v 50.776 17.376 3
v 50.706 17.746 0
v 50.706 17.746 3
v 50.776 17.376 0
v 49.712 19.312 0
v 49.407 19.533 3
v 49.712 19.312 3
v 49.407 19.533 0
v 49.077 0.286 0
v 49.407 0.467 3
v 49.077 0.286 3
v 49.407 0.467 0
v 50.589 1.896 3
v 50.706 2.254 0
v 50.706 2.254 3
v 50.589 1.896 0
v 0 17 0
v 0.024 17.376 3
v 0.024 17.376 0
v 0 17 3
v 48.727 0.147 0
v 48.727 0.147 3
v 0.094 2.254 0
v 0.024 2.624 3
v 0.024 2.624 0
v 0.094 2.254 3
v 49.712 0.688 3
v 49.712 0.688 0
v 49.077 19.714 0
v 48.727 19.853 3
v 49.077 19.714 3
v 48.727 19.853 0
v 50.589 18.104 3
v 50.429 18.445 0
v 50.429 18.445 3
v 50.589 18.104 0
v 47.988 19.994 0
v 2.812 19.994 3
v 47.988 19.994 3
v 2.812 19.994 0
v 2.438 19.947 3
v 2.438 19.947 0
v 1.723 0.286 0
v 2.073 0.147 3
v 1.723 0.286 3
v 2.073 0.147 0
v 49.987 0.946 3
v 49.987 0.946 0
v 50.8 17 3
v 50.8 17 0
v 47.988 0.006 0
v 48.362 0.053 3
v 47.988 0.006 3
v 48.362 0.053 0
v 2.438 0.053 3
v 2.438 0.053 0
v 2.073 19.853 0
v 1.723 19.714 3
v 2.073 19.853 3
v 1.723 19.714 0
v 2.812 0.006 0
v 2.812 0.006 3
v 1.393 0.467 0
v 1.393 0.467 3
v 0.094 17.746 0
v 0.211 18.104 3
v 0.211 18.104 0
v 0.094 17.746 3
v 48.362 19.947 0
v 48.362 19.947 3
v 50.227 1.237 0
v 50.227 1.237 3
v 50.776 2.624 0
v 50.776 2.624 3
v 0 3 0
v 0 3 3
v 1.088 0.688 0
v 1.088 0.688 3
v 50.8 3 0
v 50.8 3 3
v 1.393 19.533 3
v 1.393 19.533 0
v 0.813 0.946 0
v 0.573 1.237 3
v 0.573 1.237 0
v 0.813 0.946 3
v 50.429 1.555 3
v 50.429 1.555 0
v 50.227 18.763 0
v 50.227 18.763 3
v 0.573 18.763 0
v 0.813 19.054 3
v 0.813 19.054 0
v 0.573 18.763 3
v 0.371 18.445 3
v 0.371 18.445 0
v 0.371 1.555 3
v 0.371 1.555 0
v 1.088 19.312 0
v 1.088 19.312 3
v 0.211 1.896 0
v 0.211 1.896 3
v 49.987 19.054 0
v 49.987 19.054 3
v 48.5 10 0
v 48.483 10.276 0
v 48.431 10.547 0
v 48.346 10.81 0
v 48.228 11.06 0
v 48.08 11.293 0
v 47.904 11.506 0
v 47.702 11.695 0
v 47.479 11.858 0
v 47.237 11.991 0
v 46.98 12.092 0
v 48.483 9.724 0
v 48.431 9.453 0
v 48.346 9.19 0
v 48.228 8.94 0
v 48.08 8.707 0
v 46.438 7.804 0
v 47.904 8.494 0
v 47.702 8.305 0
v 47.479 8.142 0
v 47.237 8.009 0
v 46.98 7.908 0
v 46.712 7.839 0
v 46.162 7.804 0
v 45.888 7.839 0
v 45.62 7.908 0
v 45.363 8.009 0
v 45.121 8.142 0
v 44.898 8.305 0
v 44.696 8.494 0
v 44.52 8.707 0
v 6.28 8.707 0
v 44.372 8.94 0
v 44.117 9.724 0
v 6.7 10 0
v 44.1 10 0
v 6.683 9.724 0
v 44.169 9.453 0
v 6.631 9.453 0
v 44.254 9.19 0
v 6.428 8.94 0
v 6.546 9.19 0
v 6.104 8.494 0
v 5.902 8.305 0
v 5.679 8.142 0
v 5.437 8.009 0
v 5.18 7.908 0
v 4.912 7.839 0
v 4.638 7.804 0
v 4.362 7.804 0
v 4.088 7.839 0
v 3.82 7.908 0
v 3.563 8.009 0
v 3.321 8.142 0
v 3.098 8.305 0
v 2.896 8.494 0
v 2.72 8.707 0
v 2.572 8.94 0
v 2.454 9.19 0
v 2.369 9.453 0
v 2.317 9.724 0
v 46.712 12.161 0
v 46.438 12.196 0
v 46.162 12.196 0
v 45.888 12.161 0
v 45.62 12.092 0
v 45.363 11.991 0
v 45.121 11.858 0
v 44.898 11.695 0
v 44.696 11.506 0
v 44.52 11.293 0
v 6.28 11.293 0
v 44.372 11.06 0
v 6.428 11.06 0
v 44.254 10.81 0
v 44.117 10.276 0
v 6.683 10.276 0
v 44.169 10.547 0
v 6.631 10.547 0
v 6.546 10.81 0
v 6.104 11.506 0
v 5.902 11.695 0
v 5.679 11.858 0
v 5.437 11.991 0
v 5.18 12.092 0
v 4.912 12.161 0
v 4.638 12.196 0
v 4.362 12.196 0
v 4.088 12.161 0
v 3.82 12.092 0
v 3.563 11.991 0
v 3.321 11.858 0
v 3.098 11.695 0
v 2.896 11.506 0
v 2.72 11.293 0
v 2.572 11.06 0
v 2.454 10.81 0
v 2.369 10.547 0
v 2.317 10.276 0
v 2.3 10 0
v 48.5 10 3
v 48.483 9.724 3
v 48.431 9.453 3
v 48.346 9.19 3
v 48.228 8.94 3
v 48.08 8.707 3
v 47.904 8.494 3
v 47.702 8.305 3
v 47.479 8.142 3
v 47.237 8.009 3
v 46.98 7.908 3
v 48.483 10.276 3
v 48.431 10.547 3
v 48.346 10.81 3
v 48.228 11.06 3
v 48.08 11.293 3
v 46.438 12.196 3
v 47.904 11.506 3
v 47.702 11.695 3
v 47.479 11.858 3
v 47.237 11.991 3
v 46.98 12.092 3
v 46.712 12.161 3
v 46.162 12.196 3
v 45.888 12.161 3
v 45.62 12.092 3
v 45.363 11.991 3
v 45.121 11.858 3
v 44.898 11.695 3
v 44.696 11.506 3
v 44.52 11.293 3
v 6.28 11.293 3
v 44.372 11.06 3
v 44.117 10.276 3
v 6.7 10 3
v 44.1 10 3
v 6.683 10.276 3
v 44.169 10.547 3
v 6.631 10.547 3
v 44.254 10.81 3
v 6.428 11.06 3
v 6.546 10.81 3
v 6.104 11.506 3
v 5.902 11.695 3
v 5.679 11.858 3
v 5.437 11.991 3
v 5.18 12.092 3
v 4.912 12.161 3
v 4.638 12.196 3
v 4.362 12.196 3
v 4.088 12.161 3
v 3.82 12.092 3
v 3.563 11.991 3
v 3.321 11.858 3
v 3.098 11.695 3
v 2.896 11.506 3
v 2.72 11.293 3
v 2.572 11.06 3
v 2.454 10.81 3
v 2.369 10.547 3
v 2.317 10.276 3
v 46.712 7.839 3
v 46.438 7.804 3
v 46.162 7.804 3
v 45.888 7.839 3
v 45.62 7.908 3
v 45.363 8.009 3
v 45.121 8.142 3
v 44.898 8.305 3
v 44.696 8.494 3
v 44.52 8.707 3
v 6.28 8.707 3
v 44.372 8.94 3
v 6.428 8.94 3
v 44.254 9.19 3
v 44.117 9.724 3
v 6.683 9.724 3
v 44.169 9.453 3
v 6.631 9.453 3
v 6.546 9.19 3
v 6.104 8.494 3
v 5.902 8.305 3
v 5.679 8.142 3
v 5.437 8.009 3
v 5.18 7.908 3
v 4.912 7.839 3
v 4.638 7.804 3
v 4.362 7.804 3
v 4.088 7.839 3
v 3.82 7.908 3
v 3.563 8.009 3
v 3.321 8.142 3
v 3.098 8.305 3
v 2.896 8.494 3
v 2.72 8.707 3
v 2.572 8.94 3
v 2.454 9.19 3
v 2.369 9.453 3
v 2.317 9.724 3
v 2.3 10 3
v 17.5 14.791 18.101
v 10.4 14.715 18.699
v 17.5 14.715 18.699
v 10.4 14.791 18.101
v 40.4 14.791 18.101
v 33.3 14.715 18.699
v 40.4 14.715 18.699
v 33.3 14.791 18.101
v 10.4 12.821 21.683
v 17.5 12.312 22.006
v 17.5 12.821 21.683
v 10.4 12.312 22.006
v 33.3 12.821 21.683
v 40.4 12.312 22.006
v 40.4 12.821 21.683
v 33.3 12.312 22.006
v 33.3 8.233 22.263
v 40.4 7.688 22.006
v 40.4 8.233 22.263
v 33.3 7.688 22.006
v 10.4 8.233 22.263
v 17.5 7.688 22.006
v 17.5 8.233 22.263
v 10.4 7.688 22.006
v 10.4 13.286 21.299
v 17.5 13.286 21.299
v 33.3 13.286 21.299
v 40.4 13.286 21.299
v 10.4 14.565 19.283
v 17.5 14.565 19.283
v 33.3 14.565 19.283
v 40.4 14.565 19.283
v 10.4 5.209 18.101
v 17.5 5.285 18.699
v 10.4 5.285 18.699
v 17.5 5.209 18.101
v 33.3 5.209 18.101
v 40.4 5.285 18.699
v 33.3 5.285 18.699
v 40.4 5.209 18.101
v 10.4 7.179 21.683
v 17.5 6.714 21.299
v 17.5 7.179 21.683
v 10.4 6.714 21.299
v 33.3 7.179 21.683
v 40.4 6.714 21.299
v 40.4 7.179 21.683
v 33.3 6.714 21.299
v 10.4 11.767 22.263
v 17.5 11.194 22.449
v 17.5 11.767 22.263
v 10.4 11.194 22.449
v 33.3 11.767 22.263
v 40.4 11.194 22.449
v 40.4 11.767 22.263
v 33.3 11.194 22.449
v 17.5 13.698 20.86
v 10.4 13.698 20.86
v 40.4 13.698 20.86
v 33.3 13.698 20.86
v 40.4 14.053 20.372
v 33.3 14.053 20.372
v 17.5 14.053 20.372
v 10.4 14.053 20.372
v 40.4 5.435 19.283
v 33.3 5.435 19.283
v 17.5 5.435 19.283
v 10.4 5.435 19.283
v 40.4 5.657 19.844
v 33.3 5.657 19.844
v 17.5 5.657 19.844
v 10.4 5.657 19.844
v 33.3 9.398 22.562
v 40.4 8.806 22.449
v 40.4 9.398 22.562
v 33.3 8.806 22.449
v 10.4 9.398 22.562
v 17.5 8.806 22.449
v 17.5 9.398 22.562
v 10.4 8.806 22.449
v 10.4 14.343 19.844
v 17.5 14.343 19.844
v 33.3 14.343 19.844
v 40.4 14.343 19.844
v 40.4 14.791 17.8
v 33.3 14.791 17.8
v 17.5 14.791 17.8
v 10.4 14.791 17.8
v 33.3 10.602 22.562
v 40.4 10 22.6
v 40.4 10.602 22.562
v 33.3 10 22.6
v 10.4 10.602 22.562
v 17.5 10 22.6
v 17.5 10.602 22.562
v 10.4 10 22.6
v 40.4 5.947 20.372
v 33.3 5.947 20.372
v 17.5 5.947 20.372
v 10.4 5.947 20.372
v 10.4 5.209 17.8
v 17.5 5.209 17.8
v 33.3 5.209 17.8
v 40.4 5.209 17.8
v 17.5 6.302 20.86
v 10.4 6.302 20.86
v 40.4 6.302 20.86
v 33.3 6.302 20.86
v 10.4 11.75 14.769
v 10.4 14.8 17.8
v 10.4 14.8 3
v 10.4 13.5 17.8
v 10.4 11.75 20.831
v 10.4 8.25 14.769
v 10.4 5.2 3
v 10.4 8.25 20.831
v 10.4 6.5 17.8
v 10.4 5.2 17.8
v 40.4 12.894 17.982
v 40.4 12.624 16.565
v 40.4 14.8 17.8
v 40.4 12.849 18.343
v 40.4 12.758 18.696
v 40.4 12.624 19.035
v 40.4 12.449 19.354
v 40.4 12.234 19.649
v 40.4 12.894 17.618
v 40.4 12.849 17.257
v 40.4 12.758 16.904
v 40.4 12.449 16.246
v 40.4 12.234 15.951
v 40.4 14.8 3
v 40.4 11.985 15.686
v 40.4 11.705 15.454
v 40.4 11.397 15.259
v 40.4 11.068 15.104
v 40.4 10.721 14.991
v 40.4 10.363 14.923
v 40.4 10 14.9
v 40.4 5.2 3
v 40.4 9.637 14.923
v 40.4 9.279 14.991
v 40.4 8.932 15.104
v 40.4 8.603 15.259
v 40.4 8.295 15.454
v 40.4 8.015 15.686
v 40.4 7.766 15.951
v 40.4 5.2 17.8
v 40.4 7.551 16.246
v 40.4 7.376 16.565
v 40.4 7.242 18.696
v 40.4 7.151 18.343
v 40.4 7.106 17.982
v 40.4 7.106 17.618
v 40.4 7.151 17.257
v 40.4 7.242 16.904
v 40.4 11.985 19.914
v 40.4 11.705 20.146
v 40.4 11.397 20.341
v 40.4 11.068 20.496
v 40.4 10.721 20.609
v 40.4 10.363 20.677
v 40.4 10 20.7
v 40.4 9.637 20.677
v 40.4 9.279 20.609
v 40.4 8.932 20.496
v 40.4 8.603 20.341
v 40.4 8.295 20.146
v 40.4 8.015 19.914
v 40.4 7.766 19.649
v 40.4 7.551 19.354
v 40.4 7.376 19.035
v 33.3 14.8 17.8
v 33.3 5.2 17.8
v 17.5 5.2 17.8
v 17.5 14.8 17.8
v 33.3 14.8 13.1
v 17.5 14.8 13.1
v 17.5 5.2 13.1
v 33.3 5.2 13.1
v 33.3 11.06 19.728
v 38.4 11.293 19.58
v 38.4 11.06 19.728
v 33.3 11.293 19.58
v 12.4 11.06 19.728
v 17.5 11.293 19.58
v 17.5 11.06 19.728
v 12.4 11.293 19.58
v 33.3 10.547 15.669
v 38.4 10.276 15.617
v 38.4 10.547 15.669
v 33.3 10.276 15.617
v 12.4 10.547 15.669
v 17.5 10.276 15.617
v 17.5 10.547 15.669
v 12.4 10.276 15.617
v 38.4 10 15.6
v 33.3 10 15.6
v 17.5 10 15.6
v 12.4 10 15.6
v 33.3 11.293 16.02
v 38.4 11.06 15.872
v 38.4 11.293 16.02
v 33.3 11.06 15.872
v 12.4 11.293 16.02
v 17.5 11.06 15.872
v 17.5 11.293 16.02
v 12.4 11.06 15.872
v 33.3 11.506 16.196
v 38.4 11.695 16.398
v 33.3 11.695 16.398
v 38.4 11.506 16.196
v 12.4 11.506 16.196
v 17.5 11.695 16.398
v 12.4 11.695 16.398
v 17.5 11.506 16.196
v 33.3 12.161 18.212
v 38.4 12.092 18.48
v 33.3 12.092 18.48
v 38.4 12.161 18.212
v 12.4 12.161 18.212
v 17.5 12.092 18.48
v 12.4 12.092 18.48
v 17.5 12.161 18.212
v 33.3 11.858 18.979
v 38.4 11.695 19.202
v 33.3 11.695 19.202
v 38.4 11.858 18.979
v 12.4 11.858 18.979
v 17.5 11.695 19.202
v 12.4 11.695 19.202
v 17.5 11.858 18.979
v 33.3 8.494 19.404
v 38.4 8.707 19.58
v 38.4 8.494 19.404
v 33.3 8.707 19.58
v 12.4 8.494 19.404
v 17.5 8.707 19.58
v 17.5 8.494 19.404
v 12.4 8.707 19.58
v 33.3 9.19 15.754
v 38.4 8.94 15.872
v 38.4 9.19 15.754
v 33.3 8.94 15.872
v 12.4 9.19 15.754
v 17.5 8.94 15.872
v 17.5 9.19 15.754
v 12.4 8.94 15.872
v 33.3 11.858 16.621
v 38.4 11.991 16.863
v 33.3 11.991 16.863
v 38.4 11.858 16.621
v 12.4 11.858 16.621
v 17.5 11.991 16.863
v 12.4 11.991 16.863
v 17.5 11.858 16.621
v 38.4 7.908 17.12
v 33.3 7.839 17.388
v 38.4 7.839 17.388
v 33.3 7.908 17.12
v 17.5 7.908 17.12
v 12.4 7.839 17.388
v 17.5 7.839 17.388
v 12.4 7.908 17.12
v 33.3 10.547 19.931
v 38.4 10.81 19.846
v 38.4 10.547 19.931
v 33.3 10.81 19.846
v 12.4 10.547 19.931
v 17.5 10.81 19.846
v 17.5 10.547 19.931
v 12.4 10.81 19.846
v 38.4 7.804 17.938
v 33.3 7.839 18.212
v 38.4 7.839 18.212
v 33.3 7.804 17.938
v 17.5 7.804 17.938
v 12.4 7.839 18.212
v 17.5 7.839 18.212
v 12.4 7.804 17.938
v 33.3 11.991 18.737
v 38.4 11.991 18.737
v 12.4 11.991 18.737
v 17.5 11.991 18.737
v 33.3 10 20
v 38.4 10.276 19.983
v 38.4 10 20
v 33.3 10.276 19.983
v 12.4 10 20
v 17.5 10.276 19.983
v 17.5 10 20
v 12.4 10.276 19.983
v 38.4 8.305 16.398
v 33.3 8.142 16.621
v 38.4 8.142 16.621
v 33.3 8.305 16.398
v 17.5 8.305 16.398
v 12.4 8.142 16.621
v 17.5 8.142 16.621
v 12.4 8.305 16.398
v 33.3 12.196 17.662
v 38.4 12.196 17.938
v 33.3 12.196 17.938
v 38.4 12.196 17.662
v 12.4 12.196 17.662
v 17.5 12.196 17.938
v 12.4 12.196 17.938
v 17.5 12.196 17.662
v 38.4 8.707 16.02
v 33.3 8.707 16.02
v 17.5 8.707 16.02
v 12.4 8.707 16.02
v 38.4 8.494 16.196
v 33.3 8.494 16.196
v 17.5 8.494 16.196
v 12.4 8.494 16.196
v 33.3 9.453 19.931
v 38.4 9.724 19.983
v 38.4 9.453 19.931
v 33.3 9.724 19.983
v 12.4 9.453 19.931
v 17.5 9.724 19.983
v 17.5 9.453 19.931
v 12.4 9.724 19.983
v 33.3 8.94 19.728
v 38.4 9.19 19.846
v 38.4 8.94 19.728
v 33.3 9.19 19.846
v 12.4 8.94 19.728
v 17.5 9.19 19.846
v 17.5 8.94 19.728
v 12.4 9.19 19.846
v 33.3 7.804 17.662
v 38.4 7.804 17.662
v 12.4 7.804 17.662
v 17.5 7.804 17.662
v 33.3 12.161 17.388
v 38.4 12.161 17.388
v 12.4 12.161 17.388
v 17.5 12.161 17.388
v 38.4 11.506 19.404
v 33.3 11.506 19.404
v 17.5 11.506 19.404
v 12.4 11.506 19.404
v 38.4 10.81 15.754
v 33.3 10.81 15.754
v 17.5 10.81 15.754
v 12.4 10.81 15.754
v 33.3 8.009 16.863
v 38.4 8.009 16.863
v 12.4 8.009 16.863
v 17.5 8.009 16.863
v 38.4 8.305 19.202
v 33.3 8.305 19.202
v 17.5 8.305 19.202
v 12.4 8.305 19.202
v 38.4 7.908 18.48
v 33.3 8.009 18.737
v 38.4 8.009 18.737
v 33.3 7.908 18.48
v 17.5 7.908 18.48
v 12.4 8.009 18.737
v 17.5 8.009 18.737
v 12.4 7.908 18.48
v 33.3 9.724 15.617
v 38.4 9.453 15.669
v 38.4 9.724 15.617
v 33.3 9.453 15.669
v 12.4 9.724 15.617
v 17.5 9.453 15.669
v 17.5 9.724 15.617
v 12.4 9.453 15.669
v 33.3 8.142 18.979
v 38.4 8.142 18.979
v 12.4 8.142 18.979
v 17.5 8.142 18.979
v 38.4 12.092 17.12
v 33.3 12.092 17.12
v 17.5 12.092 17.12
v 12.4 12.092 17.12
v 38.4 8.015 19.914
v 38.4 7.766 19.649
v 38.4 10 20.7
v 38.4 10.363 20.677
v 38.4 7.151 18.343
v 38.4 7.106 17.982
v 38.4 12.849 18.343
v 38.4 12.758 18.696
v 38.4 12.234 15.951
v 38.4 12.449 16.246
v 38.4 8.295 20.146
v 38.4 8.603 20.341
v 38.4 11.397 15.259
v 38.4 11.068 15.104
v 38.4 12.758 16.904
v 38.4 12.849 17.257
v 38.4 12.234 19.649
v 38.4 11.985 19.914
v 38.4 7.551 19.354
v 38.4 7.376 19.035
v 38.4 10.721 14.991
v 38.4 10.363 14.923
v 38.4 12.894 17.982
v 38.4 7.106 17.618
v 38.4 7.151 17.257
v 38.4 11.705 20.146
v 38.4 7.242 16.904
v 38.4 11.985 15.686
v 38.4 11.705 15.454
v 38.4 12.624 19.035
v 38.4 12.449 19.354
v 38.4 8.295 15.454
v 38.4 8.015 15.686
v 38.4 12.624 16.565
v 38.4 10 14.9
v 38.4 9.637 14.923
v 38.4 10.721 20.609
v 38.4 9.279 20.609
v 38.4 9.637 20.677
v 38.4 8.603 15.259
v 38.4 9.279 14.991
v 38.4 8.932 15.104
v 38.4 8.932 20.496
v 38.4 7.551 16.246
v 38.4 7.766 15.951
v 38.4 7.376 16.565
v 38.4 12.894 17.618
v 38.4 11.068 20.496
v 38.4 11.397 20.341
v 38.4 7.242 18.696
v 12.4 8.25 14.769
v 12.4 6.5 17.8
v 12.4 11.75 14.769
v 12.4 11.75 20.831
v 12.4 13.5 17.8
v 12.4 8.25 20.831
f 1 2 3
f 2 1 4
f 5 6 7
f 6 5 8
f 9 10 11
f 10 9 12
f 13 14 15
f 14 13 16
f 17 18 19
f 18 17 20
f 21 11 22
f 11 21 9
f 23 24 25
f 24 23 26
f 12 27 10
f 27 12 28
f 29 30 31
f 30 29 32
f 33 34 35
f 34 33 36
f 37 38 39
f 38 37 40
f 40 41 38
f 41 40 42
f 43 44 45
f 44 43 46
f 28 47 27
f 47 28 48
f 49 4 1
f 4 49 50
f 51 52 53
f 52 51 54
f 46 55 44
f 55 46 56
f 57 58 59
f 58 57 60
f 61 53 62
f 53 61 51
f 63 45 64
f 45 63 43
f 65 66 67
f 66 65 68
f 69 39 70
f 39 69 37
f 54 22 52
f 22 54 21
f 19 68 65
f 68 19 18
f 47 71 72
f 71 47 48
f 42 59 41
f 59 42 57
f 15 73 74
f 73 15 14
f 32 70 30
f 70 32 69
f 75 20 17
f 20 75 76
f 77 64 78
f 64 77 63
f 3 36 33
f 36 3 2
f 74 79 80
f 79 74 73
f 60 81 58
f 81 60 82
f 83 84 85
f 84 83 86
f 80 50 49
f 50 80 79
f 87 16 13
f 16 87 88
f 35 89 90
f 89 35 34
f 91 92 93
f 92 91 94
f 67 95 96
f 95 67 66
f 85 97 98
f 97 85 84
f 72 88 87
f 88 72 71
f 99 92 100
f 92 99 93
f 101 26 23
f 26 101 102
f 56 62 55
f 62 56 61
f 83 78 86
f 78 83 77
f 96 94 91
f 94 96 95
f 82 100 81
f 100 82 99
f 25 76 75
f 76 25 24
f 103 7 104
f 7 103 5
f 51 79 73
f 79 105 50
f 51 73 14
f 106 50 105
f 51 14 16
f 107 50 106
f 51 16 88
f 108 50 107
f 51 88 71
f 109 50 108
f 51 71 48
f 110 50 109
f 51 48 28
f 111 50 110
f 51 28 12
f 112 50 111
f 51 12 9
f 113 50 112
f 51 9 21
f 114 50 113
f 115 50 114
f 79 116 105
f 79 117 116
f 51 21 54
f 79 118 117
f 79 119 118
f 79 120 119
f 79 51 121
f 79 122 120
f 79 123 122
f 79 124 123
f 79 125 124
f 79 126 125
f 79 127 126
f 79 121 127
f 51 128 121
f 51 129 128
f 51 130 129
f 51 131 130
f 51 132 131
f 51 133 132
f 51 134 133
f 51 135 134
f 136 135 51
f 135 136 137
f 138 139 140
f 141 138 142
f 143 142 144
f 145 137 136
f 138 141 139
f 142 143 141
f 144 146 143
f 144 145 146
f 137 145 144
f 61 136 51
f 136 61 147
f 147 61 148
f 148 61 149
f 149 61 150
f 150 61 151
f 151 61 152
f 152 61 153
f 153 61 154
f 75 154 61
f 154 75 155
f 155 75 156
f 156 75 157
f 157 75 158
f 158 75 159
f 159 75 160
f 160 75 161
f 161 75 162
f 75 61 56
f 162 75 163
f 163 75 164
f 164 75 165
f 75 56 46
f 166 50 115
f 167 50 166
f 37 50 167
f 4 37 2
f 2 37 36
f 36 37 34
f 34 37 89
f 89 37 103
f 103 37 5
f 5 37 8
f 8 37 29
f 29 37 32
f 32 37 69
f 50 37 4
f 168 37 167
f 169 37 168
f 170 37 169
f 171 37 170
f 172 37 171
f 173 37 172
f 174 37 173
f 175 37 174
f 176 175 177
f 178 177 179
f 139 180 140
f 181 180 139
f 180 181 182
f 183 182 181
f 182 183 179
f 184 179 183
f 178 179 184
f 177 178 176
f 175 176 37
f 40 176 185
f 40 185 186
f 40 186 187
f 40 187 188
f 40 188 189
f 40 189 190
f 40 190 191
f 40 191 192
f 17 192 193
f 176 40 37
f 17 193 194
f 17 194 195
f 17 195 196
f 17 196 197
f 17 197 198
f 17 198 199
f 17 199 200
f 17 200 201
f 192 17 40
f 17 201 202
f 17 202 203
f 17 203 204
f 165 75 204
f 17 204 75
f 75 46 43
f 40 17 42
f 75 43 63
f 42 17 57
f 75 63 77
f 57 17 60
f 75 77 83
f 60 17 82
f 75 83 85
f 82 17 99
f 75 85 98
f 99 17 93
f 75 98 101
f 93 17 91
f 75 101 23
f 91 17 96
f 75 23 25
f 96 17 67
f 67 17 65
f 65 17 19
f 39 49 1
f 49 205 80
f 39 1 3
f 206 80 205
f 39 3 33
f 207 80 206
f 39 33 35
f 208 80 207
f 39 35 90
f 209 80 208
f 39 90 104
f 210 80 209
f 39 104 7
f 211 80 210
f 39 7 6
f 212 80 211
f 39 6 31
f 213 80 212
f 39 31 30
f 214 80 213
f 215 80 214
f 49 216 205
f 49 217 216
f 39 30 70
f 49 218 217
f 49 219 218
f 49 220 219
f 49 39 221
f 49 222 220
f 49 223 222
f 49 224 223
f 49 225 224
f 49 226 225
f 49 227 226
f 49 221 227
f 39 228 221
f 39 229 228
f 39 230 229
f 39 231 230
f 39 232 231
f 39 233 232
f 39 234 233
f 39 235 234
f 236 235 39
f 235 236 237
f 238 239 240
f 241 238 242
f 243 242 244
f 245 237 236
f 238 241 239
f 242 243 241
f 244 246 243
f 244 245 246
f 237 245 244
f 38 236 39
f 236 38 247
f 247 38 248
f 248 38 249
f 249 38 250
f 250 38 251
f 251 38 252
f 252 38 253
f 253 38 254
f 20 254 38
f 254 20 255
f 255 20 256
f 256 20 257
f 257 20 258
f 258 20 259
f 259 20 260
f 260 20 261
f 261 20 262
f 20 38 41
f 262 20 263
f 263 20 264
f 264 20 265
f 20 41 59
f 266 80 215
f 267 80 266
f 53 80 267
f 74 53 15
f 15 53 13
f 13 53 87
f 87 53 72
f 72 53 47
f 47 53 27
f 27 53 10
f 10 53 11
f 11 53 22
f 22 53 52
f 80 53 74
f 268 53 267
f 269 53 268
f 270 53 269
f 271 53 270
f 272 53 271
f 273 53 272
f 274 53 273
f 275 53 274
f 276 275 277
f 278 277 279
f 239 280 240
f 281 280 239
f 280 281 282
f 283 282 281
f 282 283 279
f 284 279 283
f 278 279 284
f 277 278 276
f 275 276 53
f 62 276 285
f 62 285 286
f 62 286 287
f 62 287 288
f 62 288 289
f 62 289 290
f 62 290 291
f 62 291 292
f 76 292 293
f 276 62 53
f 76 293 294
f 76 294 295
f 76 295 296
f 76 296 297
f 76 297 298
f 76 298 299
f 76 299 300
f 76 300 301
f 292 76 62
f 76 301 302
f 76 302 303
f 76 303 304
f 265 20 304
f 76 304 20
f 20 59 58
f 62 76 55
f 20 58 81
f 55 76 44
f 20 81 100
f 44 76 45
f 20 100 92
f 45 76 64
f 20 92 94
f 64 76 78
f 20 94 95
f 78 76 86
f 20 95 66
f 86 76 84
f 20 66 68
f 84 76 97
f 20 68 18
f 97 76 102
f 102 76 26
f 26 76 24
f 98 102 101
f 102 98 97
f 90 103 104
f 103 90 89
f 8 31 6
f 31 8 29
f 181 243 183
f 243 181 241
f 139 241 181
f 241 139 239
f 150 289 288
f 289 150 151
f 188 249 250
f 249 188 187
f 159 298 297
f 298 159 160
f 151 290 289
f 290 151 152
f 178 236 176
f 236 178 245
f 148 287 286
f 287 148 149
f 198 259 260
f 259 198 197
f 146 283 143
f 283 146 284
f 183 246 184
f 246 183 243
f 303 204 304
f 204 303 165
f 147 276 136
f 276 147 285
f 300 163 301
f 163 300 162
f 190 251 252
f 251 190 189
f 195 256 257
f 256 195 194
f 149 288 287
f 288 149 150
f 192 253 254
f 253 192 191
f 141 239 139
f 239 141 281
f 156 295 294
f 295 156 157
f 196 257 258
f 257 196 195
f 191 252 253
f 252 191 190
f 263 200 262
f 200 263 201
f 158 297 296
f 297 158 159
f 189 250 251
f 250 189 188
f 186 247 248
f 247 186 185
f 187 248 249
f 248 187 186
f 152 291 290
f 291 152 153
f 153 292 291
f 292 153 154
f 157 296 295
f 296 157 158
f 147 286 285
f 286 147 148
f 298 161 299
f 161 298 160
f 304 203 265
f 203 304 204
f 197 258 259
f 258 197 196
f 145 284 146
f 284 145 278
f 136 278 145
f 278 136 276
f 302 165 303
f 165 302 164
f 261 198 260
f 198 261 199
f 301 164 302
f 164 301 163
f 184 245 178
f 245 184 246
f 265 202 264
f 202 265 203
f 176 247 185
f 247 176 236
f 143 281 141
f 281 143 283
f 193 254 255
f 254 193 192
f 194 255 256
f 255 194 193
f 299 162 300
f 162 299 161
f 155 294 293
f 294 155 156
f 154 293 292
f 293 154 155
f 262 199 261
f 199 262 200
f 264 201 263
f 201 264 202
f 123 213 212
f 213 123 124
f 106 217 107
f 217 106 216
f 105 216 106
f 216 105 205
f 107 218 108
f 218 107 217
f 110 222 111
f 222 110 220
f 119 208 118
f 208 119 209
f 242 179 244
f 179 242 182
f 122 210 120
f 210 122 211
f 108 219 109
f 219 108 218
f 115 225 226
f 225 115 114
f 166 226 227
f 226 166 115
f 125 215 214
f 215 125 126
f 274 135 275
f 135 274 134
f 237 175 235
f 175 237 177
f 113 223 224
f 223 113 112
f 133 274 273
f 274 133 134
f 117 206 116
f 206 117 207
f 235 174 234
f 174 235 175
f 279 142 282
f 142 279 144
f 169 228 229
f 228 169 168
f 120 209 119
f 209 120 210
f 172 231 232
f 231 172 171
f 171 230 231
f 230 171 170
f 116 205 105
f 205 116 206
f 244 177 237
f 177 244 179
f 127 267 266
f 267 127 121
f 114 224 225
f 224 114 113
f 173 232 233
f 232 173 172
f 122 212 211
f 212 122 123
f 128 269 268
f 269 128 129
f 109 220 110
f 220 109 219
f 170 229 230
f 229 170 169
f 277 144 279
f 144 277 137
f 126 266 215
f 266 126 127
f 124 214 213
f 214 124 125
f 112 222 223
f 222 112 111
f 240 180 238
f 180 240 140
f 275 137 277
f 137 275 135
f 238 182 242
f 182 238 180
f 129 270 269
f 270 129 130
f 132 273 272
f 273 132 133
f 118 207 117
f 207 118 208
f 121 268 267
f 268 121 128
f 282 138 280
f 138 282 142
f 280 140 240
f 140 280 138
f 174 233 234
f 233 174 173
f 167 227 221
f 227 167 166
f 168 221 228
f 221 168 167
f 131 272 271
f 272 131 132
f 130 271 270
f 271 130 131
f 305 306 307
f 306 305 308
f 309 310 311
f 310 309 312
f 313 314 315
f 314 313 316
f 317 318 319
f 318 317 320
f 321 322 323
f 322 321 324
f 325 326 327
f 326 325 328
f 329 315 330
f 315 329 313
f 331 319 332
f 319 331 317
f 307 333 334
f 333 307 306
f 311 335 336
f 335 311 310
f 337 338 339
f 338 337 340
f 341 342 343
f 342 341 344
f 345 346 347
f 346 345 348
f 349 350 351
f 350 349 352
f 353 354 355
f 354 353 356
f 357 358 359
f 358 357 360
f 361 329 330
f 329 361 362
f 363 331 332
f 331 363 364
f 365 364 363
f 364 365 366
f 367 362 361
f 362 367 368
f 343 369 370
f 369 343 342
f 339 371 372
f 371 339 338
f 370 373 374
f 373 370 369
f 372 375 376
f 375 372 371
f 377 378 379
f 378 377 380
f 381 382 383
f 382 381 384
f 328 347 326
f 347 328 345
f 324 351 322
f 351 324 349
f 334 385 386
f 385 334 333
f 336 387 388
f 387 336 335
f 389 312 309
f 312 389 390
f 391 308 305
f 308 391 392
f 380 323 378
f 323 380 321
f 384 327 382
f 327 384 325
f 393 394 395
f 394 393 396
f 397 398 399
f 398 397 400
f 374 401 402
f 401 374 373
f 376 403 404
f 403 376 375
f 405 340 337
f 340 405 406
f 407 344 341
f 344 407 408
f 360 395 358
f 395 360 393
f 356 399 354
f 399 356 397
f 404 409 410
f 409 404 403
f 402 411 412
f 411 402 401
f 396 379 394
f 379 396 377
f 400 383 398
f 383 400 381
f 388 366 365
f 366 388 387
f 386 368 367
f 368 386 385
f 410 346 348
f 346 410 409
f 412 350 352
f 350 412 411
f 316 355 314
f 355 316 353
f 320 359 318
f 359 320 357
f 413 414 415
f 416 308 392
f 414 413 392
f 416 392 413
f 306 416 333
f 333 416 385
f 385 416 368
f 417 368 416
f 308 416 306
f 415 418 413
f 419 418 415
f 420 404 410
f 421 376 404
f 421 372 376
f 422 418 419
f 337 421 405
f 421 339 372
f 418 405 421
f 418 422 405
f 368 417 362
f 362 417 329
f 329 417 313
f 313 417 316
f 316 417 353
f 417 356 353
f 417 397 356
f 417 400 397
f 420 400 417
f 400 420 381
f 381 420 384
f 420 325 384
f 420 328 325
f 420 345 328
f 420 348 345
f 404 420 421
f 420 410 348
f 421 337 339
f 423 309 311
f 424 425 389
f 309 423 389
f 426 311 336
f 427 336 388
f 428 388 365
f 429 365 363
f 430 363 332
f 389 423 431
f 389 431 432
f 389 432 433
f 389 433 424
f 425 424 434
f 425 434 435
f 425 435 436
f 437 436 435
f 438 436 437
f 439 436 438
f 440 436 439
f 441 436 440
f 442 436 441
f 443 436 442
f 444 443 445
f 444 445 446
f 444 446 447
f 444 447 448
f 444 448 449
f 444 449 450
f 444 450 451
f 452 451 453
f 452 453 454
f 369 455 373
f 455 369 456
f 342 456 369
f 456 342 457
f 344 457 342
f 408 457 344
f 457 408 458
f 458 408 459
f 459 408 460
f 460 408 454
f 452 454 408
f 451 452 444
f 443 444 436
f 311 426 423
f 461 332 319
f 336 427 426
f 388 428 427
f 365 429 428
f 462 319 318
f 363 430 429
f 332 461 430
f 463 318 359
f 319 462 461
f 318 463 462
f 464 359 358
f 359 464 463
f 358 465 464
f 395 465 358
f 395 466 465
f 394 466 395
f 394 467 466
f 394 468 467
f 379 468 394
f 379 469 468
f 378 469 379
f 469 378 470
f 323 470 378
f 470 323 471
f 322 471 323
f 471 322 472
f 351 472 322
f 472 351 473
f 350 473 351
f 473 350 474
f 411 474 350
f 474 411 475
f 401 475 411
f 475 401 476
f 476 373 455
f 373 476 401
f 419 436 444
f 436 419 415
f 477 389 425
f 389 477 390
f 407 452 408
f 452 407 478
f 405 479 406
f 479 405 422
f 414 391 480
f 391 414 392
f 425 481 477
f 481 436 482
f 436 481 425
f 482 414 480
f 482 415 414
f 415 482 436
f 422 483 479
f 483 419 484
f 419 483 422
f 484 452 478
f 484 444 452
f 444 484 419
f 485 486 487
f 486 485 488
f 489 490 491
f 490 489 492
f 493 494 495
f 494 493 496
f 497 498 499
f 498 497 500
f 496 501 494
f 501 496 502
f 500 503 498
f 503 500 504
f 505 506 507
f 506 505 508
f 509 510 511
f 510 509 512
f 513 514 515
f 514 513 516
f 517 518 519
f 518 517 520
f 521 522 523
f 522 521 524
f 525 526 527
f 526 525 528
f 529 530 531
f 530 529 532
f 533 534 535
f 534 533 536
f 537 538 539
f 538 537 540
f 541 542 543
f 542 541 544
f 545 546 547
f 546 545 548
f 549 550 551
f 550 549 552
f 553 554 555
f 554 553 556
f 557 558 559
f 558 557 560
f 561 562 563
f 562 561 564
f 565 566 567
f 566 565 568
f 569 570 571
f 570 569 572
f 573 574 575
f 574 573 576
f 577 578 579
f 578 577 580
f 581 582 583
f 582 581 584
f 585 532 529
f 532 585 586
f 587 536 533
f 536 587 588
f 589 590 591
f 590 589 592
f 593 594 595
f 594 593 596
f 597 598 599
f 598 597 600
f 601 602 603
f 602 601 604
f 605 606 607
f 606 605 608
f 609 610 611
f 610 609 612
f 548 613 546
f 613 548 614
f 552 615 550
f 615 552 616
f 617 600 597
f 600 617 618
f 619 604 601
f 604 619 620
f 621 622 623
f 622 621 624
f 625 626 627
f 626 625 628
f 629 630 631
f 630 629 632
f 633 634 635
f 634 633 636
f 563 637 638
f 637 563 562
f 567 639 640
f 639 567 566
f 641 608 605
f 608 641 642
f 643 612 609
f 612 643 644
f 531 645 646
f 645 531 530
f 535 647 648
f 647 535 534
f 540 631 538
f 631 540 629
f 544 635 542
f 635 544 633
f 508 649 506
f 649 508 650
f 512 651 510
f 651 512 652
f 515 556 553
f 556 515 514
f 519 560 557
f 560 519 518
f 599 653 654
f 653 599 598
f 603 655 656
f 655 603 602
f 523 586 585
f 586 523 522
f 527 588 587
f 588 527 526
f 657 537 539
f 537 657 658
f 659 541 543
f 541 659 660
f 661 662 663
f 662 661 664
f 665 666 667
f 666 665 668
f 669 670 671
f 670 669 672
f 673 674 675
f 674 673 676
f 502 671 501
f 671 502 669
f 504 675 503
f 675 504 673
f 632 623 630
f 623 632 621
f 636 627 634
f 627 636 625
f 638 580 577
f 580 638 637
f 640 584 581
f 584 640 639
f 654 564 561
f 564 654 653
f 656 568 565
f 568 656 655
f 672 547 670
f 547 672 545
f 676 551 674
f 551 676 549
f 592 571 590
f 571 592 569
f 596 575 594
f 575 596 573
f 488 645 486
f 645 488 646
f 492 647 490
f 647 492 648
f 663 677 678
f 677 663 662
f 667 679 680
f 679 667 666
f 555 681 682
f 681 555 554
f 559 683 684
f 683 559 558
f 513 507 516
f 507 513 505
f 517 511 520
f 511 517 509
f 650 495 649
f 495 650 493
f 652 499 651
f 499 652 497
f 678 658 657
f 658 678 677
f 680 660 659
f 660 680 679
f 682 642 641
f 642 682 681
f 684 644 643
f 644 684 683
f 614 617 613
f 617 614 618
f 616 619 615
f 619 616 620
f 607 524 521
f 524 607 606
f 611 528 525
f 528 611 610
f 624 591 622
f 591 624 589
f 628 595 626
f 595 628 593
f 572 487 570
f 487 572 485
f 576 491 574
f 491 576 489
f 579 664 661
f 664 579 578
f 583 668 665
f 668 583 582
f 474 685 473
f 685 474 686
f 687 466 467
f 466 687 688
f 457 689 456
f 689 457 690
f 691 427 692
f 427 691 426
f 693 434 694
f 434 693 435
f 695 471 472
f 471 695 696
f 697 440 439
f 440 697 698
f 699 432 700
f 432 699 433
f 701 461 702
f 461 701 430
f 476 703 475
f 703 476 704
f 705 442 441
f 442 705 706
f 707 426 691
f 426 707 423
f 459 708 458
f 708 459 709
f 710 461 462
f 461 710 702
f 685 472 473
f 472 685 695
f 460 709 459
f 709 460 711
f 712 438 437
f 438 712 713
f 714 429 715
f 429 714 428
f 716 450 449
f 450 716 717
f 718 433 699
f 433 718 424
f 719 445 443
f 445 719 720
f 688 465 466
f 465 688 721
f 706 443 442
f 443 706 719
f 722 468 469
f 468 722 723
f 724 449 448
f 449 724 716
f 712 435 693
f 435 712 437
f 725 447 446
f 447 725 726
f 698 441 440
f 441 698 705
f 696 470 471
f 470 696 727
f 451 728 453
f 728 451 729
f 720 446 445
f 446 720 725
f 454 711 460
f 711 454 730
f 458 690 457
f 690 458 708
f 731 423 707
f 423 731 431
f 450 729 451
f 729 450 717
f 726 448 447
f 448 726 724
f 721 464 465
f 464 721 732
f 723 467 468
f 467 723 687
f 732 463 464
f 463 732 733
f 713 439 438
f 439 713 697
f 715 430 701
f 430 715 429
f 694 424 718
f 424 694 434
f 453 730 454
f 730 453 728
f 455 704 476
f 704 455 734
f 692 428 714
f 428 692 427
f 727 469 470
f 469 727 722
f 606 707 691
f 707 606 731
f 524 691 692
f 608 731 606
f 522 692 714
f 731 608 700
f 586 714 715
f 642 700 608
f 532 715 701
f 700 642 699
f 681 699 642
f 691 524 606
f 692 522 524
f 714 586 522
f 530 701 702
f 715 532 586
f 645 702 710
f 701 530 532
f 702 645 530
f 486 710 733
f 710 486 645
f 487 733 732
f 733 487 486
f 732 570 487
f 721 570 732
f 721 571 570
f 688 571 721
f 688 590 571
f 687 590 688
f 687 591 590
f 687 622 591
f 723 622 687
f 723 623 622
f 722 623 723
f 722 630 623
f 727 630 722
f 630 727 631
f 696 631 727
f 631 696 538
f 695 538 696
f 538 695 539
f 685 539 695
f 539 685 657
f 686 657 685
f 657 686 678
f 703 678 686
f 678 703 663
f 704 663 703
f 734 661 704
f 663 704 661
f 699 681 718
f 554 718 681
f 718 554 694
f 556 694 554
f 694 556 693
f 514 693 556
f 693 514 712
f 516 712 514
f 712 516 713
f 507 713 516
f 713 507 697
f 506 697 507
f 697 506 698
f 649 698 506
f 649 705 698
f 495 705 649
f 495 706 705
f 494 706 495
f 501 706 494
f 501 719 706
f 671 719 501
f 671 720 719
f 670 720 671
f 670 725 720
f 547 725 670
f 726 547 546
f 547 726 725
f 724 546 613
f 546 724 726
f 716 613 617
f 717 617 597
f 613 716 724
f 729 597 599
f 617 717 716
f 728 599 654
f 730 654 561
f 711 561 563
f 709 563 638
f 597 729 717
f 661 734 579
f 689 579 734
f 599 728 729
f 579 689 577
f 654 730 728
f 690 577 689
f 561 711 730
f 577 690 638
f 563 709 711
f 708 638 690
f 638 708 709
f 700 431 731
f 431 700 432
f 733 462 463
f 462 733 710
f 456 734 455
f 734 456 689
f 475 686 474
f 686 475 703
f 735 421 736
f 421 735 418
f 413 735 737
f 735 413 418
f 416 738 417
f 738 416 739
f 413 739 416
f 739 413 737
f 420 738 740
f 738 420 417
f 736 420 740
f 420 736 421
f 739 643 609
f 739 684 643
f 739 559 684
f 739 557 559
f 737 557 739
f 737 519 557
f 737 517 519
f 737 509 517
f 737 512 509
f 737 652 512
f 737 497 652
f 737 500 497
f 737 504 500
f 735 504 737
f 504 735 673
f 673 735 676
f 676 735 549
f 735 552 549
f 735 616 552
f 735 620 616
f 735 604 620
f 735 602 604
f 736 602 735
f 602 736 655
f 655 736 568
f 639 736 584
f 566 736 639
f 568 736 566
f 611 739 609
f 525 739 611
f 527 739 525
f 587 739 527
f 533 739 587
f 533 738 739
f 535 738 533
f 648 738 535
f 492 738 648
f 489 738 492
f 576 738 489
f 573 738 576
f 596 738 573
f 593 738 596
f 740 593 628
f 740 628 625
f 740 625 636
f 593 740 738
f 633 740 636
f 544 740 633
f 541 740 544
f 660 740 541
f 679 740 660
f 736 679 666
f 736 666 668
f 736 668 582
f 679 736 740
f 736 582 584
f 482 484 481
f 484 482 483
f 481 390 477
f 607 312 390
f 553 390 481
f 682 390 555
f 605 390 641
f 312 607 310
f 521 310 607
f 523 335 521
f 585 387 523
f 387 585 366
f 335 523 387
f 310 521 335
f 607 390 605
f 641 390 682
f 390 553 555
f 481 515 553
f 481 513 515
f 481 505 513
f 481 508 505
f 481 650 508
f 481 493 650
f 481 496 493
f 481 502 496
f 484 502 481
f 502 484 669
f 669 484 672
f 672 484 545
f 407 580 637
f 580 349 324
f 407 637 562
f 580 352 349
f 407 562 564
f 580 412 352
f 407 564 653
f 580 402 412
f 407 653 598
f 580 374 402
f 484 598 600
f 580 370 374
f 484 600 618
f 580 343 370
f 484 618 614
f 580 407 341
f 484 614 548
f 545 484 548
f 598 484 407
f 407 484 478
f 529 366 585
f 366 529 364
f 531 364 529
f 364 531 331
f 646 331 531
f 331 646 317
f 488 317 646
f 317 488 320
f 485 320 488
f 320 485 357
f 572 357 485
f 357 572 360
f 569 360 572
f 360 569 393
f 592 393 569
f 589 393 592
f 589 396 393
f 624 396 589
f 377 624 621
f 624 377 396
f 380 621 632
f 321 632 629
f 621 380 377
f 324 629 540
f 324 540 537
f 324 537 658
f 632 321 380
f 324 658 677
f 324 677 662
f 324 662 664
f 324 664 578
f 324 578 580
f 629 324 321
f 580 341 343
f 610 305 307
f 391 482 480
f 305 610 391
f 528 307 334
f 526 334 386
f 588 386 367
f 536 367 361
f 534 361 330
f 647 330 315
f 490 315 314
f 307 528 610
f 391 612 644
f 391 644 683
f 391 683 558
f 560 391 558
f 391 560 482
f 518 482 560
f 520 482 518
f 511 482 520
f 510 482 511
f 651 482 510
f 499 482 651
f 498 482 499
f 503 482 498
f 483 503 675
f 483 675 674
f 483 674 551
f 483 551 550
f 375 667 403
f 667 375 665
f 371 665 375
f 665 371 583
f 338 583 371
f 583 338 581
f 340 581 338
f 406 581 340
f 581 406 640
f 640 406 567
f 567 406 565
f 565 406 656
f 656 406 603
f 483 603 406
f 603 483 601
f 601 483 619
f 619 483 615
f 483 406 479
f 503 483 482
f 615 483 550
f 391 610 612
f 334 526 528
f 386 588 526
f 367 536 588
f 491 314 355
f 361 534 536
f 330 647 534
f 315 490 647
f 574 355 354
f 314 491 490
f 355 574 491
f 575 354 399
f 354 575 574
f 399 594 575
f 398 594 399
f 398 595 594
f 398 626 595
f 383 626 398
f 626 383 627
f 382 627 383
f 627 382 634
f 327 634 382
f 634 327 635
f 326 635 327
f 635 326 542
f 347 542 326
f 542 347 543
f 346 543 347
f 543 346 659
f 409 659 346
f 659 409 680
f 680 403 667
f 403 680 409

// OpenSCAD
clearance = 0.1;

use_version = 2;

base_plate_length = 20;
base_plate_height = 3;
base_plate_corner_radius = 3;

base_plate_hole_diameter = 4.4;
base_plate_hole_offset = 3;

coupler_width = 30;
coupler_height = 10;
coupler_wall_width = 2.6;
coupler_inner_cut_width = 15.8;
coupler_screw_hole_diameter = 4.4;
coupler_screw_nut_diameter = 7;
coupler_screw_head_diameter = 5.8;
coupler_screw_head_height = 2;

base_plate_width = coupler_width + 2*base_plate_hole_diameter + 4*base_plate_hole_offset;


difference() {
    roundedRectangle(base_plate_width, base_plate_length, base_plate_height, base_plate_corner_radius);
    
    // Left screw hole
    translate([base_plate_corner_radius/2+base_plate_hole_offset,base_plate_length/2,-clearance]) {
        cylinder(d=base_plate_hole_diameter, h=base_plate_height+2*clearance, $fn=50);
    }

    // Right screw hole
    translate([base_plate_width-base_plate_corner_radius/2-base_plate_hole_offset,base_plate_length/2,-clearance]) {
        cylinder(d=base_plate_hole_diameter, h=base_plate_height+2*clearance, $fn=50);
    }
}

translate([base_plate_width/2-coupler_width/2, base_plate_length/2, base_plate_height+coupler_screw_hole_diameter/2+coupler_wall_width+coupler_height]) {
    
    if (use_version == 1)
        version1();
    else
        version2();
}

module version1 () {
    rotate(90, [0,1,0]) {
        difference() {

            width = coupler_screw_hole_diameter+2*coupler_wall_width;

            union() {
                cylinder(d=width, h=coupler_width, $fn=50);
                translate([0,-width/2,0]) {
                    cube([width/2+coupler_height, width, coupler_width]);
                }
            }

            // Screw hole
            translate([0,0,-clearance]) {
                cylinder(d=coupler_screw_hole_diameter, h=coupler_width+2*clearance, $fn=50);
            }
            
            // Screw head
            translate([0,0,coupler_width-coupler_screw_head_height]) {
                cylinder(d=coupler_screw_head_diameter, h=coupler_screw_head_height+clearance, $fn=50);
            }
            
            // Nut
            translate([0,0,-clearance]) {
                rotate(30, [0,0,1]) {
                    cylinder(d=coupler_screw_nut_diameter, h=coupler_screw_head_height+clearance, $fn=6);
                }
            }
            
            // Outer cuts
            cut_width = (coupler_width - coupler_inner_cut_width) / 2;
            translate([
                -coupler_screw_hole_diameter/2-coupler_wall_width-clearance,
                -coupler_screw_hole_diameter/2-coupler_wall_width-clearance,
                -clearance
            ]) {
                cube([1+coupler_screw_hole_diameter+2*coupler_wall_width,width+2*clearance,cut_width+2*clearance]);
            }
            translate([
                -coupler_screw_hole_diameter/2-coupler_wall_width-clearance,
                -coupler_screw_hole_diameter/2-coupler_wall_width-clearance,
                coupler_width-cut_width-clearance
            ]) {
                cube([1+coupler_screw_hole_diameter+2*coupler_wall_width, width+2*clearance,cut_width+2*clearance]);
            }
        }
    }
}

module version2 () {
    rotate(90, [0,1,0]) {
        difference() {

            width = coupler_screw_hole_diameter+2*coupler_wall_width;

            union() {
                cylinder(d=width, h=coupler_width, $fn=50);
                translate([0,-width/2,0]) {
                    cube([width/2+coupler_height, width, coupler_width]);
                }
            }

            // Screw hole
            translate([0,0,-clearance]) {
                cylinder(d=coupler_screw_hole_diameter, h=coupler_width+2*clearance, $fn=50);
            }
            
            // Screw head
            translate([0,0,coupler_width-coupler_screw_head_height]) {
                cylinder(d=coupler_screw_head_diameter, h=coupler_screw_head_height+clearance, $fn=50);
            }
            
            // Nut
            translate([0,0,-clearance]) {
                rotate(30, [0,0,1]) {
                    cylinder(d=coupler_screw_nut_diameter, h=coupler_screw_head_height+clearance, $fn=6);
                }
            }
            
            // Inner cut
            translate([
                -coupler_screw_hole_diameter/2-coupler_wall_width-clearance,
                -coupler_screw_hole_diameter/2-coupler_wall_width-clearance,
                coupler_width/2-coupler_inner_cut_width/2
            ]) {
                cube([coupler_screw_hole_diameter+2*coupler_wall_width,width+2*clearance,coupler_inner_cut_width]);
            }
        }
    }
}

module roundedRectangle(width, depth, height, radius) {
    hull () {    
        translate([radius,radius,0]) {
            cylinder(h=height, r=radius, $fn=50);
        }
        translate([width-radius,radius,0]) {
            cylinder(h=height, r=radius, $fn=50);
        }
        translate([radius,depth-radius,0]) {
            cylinder(h=height, r=radius, $fn=50);
        }
        translate([width-radius,depth-radius,0]) {
            cylinder(h=height, r=radius, $fn=50);
        }
    }
}
